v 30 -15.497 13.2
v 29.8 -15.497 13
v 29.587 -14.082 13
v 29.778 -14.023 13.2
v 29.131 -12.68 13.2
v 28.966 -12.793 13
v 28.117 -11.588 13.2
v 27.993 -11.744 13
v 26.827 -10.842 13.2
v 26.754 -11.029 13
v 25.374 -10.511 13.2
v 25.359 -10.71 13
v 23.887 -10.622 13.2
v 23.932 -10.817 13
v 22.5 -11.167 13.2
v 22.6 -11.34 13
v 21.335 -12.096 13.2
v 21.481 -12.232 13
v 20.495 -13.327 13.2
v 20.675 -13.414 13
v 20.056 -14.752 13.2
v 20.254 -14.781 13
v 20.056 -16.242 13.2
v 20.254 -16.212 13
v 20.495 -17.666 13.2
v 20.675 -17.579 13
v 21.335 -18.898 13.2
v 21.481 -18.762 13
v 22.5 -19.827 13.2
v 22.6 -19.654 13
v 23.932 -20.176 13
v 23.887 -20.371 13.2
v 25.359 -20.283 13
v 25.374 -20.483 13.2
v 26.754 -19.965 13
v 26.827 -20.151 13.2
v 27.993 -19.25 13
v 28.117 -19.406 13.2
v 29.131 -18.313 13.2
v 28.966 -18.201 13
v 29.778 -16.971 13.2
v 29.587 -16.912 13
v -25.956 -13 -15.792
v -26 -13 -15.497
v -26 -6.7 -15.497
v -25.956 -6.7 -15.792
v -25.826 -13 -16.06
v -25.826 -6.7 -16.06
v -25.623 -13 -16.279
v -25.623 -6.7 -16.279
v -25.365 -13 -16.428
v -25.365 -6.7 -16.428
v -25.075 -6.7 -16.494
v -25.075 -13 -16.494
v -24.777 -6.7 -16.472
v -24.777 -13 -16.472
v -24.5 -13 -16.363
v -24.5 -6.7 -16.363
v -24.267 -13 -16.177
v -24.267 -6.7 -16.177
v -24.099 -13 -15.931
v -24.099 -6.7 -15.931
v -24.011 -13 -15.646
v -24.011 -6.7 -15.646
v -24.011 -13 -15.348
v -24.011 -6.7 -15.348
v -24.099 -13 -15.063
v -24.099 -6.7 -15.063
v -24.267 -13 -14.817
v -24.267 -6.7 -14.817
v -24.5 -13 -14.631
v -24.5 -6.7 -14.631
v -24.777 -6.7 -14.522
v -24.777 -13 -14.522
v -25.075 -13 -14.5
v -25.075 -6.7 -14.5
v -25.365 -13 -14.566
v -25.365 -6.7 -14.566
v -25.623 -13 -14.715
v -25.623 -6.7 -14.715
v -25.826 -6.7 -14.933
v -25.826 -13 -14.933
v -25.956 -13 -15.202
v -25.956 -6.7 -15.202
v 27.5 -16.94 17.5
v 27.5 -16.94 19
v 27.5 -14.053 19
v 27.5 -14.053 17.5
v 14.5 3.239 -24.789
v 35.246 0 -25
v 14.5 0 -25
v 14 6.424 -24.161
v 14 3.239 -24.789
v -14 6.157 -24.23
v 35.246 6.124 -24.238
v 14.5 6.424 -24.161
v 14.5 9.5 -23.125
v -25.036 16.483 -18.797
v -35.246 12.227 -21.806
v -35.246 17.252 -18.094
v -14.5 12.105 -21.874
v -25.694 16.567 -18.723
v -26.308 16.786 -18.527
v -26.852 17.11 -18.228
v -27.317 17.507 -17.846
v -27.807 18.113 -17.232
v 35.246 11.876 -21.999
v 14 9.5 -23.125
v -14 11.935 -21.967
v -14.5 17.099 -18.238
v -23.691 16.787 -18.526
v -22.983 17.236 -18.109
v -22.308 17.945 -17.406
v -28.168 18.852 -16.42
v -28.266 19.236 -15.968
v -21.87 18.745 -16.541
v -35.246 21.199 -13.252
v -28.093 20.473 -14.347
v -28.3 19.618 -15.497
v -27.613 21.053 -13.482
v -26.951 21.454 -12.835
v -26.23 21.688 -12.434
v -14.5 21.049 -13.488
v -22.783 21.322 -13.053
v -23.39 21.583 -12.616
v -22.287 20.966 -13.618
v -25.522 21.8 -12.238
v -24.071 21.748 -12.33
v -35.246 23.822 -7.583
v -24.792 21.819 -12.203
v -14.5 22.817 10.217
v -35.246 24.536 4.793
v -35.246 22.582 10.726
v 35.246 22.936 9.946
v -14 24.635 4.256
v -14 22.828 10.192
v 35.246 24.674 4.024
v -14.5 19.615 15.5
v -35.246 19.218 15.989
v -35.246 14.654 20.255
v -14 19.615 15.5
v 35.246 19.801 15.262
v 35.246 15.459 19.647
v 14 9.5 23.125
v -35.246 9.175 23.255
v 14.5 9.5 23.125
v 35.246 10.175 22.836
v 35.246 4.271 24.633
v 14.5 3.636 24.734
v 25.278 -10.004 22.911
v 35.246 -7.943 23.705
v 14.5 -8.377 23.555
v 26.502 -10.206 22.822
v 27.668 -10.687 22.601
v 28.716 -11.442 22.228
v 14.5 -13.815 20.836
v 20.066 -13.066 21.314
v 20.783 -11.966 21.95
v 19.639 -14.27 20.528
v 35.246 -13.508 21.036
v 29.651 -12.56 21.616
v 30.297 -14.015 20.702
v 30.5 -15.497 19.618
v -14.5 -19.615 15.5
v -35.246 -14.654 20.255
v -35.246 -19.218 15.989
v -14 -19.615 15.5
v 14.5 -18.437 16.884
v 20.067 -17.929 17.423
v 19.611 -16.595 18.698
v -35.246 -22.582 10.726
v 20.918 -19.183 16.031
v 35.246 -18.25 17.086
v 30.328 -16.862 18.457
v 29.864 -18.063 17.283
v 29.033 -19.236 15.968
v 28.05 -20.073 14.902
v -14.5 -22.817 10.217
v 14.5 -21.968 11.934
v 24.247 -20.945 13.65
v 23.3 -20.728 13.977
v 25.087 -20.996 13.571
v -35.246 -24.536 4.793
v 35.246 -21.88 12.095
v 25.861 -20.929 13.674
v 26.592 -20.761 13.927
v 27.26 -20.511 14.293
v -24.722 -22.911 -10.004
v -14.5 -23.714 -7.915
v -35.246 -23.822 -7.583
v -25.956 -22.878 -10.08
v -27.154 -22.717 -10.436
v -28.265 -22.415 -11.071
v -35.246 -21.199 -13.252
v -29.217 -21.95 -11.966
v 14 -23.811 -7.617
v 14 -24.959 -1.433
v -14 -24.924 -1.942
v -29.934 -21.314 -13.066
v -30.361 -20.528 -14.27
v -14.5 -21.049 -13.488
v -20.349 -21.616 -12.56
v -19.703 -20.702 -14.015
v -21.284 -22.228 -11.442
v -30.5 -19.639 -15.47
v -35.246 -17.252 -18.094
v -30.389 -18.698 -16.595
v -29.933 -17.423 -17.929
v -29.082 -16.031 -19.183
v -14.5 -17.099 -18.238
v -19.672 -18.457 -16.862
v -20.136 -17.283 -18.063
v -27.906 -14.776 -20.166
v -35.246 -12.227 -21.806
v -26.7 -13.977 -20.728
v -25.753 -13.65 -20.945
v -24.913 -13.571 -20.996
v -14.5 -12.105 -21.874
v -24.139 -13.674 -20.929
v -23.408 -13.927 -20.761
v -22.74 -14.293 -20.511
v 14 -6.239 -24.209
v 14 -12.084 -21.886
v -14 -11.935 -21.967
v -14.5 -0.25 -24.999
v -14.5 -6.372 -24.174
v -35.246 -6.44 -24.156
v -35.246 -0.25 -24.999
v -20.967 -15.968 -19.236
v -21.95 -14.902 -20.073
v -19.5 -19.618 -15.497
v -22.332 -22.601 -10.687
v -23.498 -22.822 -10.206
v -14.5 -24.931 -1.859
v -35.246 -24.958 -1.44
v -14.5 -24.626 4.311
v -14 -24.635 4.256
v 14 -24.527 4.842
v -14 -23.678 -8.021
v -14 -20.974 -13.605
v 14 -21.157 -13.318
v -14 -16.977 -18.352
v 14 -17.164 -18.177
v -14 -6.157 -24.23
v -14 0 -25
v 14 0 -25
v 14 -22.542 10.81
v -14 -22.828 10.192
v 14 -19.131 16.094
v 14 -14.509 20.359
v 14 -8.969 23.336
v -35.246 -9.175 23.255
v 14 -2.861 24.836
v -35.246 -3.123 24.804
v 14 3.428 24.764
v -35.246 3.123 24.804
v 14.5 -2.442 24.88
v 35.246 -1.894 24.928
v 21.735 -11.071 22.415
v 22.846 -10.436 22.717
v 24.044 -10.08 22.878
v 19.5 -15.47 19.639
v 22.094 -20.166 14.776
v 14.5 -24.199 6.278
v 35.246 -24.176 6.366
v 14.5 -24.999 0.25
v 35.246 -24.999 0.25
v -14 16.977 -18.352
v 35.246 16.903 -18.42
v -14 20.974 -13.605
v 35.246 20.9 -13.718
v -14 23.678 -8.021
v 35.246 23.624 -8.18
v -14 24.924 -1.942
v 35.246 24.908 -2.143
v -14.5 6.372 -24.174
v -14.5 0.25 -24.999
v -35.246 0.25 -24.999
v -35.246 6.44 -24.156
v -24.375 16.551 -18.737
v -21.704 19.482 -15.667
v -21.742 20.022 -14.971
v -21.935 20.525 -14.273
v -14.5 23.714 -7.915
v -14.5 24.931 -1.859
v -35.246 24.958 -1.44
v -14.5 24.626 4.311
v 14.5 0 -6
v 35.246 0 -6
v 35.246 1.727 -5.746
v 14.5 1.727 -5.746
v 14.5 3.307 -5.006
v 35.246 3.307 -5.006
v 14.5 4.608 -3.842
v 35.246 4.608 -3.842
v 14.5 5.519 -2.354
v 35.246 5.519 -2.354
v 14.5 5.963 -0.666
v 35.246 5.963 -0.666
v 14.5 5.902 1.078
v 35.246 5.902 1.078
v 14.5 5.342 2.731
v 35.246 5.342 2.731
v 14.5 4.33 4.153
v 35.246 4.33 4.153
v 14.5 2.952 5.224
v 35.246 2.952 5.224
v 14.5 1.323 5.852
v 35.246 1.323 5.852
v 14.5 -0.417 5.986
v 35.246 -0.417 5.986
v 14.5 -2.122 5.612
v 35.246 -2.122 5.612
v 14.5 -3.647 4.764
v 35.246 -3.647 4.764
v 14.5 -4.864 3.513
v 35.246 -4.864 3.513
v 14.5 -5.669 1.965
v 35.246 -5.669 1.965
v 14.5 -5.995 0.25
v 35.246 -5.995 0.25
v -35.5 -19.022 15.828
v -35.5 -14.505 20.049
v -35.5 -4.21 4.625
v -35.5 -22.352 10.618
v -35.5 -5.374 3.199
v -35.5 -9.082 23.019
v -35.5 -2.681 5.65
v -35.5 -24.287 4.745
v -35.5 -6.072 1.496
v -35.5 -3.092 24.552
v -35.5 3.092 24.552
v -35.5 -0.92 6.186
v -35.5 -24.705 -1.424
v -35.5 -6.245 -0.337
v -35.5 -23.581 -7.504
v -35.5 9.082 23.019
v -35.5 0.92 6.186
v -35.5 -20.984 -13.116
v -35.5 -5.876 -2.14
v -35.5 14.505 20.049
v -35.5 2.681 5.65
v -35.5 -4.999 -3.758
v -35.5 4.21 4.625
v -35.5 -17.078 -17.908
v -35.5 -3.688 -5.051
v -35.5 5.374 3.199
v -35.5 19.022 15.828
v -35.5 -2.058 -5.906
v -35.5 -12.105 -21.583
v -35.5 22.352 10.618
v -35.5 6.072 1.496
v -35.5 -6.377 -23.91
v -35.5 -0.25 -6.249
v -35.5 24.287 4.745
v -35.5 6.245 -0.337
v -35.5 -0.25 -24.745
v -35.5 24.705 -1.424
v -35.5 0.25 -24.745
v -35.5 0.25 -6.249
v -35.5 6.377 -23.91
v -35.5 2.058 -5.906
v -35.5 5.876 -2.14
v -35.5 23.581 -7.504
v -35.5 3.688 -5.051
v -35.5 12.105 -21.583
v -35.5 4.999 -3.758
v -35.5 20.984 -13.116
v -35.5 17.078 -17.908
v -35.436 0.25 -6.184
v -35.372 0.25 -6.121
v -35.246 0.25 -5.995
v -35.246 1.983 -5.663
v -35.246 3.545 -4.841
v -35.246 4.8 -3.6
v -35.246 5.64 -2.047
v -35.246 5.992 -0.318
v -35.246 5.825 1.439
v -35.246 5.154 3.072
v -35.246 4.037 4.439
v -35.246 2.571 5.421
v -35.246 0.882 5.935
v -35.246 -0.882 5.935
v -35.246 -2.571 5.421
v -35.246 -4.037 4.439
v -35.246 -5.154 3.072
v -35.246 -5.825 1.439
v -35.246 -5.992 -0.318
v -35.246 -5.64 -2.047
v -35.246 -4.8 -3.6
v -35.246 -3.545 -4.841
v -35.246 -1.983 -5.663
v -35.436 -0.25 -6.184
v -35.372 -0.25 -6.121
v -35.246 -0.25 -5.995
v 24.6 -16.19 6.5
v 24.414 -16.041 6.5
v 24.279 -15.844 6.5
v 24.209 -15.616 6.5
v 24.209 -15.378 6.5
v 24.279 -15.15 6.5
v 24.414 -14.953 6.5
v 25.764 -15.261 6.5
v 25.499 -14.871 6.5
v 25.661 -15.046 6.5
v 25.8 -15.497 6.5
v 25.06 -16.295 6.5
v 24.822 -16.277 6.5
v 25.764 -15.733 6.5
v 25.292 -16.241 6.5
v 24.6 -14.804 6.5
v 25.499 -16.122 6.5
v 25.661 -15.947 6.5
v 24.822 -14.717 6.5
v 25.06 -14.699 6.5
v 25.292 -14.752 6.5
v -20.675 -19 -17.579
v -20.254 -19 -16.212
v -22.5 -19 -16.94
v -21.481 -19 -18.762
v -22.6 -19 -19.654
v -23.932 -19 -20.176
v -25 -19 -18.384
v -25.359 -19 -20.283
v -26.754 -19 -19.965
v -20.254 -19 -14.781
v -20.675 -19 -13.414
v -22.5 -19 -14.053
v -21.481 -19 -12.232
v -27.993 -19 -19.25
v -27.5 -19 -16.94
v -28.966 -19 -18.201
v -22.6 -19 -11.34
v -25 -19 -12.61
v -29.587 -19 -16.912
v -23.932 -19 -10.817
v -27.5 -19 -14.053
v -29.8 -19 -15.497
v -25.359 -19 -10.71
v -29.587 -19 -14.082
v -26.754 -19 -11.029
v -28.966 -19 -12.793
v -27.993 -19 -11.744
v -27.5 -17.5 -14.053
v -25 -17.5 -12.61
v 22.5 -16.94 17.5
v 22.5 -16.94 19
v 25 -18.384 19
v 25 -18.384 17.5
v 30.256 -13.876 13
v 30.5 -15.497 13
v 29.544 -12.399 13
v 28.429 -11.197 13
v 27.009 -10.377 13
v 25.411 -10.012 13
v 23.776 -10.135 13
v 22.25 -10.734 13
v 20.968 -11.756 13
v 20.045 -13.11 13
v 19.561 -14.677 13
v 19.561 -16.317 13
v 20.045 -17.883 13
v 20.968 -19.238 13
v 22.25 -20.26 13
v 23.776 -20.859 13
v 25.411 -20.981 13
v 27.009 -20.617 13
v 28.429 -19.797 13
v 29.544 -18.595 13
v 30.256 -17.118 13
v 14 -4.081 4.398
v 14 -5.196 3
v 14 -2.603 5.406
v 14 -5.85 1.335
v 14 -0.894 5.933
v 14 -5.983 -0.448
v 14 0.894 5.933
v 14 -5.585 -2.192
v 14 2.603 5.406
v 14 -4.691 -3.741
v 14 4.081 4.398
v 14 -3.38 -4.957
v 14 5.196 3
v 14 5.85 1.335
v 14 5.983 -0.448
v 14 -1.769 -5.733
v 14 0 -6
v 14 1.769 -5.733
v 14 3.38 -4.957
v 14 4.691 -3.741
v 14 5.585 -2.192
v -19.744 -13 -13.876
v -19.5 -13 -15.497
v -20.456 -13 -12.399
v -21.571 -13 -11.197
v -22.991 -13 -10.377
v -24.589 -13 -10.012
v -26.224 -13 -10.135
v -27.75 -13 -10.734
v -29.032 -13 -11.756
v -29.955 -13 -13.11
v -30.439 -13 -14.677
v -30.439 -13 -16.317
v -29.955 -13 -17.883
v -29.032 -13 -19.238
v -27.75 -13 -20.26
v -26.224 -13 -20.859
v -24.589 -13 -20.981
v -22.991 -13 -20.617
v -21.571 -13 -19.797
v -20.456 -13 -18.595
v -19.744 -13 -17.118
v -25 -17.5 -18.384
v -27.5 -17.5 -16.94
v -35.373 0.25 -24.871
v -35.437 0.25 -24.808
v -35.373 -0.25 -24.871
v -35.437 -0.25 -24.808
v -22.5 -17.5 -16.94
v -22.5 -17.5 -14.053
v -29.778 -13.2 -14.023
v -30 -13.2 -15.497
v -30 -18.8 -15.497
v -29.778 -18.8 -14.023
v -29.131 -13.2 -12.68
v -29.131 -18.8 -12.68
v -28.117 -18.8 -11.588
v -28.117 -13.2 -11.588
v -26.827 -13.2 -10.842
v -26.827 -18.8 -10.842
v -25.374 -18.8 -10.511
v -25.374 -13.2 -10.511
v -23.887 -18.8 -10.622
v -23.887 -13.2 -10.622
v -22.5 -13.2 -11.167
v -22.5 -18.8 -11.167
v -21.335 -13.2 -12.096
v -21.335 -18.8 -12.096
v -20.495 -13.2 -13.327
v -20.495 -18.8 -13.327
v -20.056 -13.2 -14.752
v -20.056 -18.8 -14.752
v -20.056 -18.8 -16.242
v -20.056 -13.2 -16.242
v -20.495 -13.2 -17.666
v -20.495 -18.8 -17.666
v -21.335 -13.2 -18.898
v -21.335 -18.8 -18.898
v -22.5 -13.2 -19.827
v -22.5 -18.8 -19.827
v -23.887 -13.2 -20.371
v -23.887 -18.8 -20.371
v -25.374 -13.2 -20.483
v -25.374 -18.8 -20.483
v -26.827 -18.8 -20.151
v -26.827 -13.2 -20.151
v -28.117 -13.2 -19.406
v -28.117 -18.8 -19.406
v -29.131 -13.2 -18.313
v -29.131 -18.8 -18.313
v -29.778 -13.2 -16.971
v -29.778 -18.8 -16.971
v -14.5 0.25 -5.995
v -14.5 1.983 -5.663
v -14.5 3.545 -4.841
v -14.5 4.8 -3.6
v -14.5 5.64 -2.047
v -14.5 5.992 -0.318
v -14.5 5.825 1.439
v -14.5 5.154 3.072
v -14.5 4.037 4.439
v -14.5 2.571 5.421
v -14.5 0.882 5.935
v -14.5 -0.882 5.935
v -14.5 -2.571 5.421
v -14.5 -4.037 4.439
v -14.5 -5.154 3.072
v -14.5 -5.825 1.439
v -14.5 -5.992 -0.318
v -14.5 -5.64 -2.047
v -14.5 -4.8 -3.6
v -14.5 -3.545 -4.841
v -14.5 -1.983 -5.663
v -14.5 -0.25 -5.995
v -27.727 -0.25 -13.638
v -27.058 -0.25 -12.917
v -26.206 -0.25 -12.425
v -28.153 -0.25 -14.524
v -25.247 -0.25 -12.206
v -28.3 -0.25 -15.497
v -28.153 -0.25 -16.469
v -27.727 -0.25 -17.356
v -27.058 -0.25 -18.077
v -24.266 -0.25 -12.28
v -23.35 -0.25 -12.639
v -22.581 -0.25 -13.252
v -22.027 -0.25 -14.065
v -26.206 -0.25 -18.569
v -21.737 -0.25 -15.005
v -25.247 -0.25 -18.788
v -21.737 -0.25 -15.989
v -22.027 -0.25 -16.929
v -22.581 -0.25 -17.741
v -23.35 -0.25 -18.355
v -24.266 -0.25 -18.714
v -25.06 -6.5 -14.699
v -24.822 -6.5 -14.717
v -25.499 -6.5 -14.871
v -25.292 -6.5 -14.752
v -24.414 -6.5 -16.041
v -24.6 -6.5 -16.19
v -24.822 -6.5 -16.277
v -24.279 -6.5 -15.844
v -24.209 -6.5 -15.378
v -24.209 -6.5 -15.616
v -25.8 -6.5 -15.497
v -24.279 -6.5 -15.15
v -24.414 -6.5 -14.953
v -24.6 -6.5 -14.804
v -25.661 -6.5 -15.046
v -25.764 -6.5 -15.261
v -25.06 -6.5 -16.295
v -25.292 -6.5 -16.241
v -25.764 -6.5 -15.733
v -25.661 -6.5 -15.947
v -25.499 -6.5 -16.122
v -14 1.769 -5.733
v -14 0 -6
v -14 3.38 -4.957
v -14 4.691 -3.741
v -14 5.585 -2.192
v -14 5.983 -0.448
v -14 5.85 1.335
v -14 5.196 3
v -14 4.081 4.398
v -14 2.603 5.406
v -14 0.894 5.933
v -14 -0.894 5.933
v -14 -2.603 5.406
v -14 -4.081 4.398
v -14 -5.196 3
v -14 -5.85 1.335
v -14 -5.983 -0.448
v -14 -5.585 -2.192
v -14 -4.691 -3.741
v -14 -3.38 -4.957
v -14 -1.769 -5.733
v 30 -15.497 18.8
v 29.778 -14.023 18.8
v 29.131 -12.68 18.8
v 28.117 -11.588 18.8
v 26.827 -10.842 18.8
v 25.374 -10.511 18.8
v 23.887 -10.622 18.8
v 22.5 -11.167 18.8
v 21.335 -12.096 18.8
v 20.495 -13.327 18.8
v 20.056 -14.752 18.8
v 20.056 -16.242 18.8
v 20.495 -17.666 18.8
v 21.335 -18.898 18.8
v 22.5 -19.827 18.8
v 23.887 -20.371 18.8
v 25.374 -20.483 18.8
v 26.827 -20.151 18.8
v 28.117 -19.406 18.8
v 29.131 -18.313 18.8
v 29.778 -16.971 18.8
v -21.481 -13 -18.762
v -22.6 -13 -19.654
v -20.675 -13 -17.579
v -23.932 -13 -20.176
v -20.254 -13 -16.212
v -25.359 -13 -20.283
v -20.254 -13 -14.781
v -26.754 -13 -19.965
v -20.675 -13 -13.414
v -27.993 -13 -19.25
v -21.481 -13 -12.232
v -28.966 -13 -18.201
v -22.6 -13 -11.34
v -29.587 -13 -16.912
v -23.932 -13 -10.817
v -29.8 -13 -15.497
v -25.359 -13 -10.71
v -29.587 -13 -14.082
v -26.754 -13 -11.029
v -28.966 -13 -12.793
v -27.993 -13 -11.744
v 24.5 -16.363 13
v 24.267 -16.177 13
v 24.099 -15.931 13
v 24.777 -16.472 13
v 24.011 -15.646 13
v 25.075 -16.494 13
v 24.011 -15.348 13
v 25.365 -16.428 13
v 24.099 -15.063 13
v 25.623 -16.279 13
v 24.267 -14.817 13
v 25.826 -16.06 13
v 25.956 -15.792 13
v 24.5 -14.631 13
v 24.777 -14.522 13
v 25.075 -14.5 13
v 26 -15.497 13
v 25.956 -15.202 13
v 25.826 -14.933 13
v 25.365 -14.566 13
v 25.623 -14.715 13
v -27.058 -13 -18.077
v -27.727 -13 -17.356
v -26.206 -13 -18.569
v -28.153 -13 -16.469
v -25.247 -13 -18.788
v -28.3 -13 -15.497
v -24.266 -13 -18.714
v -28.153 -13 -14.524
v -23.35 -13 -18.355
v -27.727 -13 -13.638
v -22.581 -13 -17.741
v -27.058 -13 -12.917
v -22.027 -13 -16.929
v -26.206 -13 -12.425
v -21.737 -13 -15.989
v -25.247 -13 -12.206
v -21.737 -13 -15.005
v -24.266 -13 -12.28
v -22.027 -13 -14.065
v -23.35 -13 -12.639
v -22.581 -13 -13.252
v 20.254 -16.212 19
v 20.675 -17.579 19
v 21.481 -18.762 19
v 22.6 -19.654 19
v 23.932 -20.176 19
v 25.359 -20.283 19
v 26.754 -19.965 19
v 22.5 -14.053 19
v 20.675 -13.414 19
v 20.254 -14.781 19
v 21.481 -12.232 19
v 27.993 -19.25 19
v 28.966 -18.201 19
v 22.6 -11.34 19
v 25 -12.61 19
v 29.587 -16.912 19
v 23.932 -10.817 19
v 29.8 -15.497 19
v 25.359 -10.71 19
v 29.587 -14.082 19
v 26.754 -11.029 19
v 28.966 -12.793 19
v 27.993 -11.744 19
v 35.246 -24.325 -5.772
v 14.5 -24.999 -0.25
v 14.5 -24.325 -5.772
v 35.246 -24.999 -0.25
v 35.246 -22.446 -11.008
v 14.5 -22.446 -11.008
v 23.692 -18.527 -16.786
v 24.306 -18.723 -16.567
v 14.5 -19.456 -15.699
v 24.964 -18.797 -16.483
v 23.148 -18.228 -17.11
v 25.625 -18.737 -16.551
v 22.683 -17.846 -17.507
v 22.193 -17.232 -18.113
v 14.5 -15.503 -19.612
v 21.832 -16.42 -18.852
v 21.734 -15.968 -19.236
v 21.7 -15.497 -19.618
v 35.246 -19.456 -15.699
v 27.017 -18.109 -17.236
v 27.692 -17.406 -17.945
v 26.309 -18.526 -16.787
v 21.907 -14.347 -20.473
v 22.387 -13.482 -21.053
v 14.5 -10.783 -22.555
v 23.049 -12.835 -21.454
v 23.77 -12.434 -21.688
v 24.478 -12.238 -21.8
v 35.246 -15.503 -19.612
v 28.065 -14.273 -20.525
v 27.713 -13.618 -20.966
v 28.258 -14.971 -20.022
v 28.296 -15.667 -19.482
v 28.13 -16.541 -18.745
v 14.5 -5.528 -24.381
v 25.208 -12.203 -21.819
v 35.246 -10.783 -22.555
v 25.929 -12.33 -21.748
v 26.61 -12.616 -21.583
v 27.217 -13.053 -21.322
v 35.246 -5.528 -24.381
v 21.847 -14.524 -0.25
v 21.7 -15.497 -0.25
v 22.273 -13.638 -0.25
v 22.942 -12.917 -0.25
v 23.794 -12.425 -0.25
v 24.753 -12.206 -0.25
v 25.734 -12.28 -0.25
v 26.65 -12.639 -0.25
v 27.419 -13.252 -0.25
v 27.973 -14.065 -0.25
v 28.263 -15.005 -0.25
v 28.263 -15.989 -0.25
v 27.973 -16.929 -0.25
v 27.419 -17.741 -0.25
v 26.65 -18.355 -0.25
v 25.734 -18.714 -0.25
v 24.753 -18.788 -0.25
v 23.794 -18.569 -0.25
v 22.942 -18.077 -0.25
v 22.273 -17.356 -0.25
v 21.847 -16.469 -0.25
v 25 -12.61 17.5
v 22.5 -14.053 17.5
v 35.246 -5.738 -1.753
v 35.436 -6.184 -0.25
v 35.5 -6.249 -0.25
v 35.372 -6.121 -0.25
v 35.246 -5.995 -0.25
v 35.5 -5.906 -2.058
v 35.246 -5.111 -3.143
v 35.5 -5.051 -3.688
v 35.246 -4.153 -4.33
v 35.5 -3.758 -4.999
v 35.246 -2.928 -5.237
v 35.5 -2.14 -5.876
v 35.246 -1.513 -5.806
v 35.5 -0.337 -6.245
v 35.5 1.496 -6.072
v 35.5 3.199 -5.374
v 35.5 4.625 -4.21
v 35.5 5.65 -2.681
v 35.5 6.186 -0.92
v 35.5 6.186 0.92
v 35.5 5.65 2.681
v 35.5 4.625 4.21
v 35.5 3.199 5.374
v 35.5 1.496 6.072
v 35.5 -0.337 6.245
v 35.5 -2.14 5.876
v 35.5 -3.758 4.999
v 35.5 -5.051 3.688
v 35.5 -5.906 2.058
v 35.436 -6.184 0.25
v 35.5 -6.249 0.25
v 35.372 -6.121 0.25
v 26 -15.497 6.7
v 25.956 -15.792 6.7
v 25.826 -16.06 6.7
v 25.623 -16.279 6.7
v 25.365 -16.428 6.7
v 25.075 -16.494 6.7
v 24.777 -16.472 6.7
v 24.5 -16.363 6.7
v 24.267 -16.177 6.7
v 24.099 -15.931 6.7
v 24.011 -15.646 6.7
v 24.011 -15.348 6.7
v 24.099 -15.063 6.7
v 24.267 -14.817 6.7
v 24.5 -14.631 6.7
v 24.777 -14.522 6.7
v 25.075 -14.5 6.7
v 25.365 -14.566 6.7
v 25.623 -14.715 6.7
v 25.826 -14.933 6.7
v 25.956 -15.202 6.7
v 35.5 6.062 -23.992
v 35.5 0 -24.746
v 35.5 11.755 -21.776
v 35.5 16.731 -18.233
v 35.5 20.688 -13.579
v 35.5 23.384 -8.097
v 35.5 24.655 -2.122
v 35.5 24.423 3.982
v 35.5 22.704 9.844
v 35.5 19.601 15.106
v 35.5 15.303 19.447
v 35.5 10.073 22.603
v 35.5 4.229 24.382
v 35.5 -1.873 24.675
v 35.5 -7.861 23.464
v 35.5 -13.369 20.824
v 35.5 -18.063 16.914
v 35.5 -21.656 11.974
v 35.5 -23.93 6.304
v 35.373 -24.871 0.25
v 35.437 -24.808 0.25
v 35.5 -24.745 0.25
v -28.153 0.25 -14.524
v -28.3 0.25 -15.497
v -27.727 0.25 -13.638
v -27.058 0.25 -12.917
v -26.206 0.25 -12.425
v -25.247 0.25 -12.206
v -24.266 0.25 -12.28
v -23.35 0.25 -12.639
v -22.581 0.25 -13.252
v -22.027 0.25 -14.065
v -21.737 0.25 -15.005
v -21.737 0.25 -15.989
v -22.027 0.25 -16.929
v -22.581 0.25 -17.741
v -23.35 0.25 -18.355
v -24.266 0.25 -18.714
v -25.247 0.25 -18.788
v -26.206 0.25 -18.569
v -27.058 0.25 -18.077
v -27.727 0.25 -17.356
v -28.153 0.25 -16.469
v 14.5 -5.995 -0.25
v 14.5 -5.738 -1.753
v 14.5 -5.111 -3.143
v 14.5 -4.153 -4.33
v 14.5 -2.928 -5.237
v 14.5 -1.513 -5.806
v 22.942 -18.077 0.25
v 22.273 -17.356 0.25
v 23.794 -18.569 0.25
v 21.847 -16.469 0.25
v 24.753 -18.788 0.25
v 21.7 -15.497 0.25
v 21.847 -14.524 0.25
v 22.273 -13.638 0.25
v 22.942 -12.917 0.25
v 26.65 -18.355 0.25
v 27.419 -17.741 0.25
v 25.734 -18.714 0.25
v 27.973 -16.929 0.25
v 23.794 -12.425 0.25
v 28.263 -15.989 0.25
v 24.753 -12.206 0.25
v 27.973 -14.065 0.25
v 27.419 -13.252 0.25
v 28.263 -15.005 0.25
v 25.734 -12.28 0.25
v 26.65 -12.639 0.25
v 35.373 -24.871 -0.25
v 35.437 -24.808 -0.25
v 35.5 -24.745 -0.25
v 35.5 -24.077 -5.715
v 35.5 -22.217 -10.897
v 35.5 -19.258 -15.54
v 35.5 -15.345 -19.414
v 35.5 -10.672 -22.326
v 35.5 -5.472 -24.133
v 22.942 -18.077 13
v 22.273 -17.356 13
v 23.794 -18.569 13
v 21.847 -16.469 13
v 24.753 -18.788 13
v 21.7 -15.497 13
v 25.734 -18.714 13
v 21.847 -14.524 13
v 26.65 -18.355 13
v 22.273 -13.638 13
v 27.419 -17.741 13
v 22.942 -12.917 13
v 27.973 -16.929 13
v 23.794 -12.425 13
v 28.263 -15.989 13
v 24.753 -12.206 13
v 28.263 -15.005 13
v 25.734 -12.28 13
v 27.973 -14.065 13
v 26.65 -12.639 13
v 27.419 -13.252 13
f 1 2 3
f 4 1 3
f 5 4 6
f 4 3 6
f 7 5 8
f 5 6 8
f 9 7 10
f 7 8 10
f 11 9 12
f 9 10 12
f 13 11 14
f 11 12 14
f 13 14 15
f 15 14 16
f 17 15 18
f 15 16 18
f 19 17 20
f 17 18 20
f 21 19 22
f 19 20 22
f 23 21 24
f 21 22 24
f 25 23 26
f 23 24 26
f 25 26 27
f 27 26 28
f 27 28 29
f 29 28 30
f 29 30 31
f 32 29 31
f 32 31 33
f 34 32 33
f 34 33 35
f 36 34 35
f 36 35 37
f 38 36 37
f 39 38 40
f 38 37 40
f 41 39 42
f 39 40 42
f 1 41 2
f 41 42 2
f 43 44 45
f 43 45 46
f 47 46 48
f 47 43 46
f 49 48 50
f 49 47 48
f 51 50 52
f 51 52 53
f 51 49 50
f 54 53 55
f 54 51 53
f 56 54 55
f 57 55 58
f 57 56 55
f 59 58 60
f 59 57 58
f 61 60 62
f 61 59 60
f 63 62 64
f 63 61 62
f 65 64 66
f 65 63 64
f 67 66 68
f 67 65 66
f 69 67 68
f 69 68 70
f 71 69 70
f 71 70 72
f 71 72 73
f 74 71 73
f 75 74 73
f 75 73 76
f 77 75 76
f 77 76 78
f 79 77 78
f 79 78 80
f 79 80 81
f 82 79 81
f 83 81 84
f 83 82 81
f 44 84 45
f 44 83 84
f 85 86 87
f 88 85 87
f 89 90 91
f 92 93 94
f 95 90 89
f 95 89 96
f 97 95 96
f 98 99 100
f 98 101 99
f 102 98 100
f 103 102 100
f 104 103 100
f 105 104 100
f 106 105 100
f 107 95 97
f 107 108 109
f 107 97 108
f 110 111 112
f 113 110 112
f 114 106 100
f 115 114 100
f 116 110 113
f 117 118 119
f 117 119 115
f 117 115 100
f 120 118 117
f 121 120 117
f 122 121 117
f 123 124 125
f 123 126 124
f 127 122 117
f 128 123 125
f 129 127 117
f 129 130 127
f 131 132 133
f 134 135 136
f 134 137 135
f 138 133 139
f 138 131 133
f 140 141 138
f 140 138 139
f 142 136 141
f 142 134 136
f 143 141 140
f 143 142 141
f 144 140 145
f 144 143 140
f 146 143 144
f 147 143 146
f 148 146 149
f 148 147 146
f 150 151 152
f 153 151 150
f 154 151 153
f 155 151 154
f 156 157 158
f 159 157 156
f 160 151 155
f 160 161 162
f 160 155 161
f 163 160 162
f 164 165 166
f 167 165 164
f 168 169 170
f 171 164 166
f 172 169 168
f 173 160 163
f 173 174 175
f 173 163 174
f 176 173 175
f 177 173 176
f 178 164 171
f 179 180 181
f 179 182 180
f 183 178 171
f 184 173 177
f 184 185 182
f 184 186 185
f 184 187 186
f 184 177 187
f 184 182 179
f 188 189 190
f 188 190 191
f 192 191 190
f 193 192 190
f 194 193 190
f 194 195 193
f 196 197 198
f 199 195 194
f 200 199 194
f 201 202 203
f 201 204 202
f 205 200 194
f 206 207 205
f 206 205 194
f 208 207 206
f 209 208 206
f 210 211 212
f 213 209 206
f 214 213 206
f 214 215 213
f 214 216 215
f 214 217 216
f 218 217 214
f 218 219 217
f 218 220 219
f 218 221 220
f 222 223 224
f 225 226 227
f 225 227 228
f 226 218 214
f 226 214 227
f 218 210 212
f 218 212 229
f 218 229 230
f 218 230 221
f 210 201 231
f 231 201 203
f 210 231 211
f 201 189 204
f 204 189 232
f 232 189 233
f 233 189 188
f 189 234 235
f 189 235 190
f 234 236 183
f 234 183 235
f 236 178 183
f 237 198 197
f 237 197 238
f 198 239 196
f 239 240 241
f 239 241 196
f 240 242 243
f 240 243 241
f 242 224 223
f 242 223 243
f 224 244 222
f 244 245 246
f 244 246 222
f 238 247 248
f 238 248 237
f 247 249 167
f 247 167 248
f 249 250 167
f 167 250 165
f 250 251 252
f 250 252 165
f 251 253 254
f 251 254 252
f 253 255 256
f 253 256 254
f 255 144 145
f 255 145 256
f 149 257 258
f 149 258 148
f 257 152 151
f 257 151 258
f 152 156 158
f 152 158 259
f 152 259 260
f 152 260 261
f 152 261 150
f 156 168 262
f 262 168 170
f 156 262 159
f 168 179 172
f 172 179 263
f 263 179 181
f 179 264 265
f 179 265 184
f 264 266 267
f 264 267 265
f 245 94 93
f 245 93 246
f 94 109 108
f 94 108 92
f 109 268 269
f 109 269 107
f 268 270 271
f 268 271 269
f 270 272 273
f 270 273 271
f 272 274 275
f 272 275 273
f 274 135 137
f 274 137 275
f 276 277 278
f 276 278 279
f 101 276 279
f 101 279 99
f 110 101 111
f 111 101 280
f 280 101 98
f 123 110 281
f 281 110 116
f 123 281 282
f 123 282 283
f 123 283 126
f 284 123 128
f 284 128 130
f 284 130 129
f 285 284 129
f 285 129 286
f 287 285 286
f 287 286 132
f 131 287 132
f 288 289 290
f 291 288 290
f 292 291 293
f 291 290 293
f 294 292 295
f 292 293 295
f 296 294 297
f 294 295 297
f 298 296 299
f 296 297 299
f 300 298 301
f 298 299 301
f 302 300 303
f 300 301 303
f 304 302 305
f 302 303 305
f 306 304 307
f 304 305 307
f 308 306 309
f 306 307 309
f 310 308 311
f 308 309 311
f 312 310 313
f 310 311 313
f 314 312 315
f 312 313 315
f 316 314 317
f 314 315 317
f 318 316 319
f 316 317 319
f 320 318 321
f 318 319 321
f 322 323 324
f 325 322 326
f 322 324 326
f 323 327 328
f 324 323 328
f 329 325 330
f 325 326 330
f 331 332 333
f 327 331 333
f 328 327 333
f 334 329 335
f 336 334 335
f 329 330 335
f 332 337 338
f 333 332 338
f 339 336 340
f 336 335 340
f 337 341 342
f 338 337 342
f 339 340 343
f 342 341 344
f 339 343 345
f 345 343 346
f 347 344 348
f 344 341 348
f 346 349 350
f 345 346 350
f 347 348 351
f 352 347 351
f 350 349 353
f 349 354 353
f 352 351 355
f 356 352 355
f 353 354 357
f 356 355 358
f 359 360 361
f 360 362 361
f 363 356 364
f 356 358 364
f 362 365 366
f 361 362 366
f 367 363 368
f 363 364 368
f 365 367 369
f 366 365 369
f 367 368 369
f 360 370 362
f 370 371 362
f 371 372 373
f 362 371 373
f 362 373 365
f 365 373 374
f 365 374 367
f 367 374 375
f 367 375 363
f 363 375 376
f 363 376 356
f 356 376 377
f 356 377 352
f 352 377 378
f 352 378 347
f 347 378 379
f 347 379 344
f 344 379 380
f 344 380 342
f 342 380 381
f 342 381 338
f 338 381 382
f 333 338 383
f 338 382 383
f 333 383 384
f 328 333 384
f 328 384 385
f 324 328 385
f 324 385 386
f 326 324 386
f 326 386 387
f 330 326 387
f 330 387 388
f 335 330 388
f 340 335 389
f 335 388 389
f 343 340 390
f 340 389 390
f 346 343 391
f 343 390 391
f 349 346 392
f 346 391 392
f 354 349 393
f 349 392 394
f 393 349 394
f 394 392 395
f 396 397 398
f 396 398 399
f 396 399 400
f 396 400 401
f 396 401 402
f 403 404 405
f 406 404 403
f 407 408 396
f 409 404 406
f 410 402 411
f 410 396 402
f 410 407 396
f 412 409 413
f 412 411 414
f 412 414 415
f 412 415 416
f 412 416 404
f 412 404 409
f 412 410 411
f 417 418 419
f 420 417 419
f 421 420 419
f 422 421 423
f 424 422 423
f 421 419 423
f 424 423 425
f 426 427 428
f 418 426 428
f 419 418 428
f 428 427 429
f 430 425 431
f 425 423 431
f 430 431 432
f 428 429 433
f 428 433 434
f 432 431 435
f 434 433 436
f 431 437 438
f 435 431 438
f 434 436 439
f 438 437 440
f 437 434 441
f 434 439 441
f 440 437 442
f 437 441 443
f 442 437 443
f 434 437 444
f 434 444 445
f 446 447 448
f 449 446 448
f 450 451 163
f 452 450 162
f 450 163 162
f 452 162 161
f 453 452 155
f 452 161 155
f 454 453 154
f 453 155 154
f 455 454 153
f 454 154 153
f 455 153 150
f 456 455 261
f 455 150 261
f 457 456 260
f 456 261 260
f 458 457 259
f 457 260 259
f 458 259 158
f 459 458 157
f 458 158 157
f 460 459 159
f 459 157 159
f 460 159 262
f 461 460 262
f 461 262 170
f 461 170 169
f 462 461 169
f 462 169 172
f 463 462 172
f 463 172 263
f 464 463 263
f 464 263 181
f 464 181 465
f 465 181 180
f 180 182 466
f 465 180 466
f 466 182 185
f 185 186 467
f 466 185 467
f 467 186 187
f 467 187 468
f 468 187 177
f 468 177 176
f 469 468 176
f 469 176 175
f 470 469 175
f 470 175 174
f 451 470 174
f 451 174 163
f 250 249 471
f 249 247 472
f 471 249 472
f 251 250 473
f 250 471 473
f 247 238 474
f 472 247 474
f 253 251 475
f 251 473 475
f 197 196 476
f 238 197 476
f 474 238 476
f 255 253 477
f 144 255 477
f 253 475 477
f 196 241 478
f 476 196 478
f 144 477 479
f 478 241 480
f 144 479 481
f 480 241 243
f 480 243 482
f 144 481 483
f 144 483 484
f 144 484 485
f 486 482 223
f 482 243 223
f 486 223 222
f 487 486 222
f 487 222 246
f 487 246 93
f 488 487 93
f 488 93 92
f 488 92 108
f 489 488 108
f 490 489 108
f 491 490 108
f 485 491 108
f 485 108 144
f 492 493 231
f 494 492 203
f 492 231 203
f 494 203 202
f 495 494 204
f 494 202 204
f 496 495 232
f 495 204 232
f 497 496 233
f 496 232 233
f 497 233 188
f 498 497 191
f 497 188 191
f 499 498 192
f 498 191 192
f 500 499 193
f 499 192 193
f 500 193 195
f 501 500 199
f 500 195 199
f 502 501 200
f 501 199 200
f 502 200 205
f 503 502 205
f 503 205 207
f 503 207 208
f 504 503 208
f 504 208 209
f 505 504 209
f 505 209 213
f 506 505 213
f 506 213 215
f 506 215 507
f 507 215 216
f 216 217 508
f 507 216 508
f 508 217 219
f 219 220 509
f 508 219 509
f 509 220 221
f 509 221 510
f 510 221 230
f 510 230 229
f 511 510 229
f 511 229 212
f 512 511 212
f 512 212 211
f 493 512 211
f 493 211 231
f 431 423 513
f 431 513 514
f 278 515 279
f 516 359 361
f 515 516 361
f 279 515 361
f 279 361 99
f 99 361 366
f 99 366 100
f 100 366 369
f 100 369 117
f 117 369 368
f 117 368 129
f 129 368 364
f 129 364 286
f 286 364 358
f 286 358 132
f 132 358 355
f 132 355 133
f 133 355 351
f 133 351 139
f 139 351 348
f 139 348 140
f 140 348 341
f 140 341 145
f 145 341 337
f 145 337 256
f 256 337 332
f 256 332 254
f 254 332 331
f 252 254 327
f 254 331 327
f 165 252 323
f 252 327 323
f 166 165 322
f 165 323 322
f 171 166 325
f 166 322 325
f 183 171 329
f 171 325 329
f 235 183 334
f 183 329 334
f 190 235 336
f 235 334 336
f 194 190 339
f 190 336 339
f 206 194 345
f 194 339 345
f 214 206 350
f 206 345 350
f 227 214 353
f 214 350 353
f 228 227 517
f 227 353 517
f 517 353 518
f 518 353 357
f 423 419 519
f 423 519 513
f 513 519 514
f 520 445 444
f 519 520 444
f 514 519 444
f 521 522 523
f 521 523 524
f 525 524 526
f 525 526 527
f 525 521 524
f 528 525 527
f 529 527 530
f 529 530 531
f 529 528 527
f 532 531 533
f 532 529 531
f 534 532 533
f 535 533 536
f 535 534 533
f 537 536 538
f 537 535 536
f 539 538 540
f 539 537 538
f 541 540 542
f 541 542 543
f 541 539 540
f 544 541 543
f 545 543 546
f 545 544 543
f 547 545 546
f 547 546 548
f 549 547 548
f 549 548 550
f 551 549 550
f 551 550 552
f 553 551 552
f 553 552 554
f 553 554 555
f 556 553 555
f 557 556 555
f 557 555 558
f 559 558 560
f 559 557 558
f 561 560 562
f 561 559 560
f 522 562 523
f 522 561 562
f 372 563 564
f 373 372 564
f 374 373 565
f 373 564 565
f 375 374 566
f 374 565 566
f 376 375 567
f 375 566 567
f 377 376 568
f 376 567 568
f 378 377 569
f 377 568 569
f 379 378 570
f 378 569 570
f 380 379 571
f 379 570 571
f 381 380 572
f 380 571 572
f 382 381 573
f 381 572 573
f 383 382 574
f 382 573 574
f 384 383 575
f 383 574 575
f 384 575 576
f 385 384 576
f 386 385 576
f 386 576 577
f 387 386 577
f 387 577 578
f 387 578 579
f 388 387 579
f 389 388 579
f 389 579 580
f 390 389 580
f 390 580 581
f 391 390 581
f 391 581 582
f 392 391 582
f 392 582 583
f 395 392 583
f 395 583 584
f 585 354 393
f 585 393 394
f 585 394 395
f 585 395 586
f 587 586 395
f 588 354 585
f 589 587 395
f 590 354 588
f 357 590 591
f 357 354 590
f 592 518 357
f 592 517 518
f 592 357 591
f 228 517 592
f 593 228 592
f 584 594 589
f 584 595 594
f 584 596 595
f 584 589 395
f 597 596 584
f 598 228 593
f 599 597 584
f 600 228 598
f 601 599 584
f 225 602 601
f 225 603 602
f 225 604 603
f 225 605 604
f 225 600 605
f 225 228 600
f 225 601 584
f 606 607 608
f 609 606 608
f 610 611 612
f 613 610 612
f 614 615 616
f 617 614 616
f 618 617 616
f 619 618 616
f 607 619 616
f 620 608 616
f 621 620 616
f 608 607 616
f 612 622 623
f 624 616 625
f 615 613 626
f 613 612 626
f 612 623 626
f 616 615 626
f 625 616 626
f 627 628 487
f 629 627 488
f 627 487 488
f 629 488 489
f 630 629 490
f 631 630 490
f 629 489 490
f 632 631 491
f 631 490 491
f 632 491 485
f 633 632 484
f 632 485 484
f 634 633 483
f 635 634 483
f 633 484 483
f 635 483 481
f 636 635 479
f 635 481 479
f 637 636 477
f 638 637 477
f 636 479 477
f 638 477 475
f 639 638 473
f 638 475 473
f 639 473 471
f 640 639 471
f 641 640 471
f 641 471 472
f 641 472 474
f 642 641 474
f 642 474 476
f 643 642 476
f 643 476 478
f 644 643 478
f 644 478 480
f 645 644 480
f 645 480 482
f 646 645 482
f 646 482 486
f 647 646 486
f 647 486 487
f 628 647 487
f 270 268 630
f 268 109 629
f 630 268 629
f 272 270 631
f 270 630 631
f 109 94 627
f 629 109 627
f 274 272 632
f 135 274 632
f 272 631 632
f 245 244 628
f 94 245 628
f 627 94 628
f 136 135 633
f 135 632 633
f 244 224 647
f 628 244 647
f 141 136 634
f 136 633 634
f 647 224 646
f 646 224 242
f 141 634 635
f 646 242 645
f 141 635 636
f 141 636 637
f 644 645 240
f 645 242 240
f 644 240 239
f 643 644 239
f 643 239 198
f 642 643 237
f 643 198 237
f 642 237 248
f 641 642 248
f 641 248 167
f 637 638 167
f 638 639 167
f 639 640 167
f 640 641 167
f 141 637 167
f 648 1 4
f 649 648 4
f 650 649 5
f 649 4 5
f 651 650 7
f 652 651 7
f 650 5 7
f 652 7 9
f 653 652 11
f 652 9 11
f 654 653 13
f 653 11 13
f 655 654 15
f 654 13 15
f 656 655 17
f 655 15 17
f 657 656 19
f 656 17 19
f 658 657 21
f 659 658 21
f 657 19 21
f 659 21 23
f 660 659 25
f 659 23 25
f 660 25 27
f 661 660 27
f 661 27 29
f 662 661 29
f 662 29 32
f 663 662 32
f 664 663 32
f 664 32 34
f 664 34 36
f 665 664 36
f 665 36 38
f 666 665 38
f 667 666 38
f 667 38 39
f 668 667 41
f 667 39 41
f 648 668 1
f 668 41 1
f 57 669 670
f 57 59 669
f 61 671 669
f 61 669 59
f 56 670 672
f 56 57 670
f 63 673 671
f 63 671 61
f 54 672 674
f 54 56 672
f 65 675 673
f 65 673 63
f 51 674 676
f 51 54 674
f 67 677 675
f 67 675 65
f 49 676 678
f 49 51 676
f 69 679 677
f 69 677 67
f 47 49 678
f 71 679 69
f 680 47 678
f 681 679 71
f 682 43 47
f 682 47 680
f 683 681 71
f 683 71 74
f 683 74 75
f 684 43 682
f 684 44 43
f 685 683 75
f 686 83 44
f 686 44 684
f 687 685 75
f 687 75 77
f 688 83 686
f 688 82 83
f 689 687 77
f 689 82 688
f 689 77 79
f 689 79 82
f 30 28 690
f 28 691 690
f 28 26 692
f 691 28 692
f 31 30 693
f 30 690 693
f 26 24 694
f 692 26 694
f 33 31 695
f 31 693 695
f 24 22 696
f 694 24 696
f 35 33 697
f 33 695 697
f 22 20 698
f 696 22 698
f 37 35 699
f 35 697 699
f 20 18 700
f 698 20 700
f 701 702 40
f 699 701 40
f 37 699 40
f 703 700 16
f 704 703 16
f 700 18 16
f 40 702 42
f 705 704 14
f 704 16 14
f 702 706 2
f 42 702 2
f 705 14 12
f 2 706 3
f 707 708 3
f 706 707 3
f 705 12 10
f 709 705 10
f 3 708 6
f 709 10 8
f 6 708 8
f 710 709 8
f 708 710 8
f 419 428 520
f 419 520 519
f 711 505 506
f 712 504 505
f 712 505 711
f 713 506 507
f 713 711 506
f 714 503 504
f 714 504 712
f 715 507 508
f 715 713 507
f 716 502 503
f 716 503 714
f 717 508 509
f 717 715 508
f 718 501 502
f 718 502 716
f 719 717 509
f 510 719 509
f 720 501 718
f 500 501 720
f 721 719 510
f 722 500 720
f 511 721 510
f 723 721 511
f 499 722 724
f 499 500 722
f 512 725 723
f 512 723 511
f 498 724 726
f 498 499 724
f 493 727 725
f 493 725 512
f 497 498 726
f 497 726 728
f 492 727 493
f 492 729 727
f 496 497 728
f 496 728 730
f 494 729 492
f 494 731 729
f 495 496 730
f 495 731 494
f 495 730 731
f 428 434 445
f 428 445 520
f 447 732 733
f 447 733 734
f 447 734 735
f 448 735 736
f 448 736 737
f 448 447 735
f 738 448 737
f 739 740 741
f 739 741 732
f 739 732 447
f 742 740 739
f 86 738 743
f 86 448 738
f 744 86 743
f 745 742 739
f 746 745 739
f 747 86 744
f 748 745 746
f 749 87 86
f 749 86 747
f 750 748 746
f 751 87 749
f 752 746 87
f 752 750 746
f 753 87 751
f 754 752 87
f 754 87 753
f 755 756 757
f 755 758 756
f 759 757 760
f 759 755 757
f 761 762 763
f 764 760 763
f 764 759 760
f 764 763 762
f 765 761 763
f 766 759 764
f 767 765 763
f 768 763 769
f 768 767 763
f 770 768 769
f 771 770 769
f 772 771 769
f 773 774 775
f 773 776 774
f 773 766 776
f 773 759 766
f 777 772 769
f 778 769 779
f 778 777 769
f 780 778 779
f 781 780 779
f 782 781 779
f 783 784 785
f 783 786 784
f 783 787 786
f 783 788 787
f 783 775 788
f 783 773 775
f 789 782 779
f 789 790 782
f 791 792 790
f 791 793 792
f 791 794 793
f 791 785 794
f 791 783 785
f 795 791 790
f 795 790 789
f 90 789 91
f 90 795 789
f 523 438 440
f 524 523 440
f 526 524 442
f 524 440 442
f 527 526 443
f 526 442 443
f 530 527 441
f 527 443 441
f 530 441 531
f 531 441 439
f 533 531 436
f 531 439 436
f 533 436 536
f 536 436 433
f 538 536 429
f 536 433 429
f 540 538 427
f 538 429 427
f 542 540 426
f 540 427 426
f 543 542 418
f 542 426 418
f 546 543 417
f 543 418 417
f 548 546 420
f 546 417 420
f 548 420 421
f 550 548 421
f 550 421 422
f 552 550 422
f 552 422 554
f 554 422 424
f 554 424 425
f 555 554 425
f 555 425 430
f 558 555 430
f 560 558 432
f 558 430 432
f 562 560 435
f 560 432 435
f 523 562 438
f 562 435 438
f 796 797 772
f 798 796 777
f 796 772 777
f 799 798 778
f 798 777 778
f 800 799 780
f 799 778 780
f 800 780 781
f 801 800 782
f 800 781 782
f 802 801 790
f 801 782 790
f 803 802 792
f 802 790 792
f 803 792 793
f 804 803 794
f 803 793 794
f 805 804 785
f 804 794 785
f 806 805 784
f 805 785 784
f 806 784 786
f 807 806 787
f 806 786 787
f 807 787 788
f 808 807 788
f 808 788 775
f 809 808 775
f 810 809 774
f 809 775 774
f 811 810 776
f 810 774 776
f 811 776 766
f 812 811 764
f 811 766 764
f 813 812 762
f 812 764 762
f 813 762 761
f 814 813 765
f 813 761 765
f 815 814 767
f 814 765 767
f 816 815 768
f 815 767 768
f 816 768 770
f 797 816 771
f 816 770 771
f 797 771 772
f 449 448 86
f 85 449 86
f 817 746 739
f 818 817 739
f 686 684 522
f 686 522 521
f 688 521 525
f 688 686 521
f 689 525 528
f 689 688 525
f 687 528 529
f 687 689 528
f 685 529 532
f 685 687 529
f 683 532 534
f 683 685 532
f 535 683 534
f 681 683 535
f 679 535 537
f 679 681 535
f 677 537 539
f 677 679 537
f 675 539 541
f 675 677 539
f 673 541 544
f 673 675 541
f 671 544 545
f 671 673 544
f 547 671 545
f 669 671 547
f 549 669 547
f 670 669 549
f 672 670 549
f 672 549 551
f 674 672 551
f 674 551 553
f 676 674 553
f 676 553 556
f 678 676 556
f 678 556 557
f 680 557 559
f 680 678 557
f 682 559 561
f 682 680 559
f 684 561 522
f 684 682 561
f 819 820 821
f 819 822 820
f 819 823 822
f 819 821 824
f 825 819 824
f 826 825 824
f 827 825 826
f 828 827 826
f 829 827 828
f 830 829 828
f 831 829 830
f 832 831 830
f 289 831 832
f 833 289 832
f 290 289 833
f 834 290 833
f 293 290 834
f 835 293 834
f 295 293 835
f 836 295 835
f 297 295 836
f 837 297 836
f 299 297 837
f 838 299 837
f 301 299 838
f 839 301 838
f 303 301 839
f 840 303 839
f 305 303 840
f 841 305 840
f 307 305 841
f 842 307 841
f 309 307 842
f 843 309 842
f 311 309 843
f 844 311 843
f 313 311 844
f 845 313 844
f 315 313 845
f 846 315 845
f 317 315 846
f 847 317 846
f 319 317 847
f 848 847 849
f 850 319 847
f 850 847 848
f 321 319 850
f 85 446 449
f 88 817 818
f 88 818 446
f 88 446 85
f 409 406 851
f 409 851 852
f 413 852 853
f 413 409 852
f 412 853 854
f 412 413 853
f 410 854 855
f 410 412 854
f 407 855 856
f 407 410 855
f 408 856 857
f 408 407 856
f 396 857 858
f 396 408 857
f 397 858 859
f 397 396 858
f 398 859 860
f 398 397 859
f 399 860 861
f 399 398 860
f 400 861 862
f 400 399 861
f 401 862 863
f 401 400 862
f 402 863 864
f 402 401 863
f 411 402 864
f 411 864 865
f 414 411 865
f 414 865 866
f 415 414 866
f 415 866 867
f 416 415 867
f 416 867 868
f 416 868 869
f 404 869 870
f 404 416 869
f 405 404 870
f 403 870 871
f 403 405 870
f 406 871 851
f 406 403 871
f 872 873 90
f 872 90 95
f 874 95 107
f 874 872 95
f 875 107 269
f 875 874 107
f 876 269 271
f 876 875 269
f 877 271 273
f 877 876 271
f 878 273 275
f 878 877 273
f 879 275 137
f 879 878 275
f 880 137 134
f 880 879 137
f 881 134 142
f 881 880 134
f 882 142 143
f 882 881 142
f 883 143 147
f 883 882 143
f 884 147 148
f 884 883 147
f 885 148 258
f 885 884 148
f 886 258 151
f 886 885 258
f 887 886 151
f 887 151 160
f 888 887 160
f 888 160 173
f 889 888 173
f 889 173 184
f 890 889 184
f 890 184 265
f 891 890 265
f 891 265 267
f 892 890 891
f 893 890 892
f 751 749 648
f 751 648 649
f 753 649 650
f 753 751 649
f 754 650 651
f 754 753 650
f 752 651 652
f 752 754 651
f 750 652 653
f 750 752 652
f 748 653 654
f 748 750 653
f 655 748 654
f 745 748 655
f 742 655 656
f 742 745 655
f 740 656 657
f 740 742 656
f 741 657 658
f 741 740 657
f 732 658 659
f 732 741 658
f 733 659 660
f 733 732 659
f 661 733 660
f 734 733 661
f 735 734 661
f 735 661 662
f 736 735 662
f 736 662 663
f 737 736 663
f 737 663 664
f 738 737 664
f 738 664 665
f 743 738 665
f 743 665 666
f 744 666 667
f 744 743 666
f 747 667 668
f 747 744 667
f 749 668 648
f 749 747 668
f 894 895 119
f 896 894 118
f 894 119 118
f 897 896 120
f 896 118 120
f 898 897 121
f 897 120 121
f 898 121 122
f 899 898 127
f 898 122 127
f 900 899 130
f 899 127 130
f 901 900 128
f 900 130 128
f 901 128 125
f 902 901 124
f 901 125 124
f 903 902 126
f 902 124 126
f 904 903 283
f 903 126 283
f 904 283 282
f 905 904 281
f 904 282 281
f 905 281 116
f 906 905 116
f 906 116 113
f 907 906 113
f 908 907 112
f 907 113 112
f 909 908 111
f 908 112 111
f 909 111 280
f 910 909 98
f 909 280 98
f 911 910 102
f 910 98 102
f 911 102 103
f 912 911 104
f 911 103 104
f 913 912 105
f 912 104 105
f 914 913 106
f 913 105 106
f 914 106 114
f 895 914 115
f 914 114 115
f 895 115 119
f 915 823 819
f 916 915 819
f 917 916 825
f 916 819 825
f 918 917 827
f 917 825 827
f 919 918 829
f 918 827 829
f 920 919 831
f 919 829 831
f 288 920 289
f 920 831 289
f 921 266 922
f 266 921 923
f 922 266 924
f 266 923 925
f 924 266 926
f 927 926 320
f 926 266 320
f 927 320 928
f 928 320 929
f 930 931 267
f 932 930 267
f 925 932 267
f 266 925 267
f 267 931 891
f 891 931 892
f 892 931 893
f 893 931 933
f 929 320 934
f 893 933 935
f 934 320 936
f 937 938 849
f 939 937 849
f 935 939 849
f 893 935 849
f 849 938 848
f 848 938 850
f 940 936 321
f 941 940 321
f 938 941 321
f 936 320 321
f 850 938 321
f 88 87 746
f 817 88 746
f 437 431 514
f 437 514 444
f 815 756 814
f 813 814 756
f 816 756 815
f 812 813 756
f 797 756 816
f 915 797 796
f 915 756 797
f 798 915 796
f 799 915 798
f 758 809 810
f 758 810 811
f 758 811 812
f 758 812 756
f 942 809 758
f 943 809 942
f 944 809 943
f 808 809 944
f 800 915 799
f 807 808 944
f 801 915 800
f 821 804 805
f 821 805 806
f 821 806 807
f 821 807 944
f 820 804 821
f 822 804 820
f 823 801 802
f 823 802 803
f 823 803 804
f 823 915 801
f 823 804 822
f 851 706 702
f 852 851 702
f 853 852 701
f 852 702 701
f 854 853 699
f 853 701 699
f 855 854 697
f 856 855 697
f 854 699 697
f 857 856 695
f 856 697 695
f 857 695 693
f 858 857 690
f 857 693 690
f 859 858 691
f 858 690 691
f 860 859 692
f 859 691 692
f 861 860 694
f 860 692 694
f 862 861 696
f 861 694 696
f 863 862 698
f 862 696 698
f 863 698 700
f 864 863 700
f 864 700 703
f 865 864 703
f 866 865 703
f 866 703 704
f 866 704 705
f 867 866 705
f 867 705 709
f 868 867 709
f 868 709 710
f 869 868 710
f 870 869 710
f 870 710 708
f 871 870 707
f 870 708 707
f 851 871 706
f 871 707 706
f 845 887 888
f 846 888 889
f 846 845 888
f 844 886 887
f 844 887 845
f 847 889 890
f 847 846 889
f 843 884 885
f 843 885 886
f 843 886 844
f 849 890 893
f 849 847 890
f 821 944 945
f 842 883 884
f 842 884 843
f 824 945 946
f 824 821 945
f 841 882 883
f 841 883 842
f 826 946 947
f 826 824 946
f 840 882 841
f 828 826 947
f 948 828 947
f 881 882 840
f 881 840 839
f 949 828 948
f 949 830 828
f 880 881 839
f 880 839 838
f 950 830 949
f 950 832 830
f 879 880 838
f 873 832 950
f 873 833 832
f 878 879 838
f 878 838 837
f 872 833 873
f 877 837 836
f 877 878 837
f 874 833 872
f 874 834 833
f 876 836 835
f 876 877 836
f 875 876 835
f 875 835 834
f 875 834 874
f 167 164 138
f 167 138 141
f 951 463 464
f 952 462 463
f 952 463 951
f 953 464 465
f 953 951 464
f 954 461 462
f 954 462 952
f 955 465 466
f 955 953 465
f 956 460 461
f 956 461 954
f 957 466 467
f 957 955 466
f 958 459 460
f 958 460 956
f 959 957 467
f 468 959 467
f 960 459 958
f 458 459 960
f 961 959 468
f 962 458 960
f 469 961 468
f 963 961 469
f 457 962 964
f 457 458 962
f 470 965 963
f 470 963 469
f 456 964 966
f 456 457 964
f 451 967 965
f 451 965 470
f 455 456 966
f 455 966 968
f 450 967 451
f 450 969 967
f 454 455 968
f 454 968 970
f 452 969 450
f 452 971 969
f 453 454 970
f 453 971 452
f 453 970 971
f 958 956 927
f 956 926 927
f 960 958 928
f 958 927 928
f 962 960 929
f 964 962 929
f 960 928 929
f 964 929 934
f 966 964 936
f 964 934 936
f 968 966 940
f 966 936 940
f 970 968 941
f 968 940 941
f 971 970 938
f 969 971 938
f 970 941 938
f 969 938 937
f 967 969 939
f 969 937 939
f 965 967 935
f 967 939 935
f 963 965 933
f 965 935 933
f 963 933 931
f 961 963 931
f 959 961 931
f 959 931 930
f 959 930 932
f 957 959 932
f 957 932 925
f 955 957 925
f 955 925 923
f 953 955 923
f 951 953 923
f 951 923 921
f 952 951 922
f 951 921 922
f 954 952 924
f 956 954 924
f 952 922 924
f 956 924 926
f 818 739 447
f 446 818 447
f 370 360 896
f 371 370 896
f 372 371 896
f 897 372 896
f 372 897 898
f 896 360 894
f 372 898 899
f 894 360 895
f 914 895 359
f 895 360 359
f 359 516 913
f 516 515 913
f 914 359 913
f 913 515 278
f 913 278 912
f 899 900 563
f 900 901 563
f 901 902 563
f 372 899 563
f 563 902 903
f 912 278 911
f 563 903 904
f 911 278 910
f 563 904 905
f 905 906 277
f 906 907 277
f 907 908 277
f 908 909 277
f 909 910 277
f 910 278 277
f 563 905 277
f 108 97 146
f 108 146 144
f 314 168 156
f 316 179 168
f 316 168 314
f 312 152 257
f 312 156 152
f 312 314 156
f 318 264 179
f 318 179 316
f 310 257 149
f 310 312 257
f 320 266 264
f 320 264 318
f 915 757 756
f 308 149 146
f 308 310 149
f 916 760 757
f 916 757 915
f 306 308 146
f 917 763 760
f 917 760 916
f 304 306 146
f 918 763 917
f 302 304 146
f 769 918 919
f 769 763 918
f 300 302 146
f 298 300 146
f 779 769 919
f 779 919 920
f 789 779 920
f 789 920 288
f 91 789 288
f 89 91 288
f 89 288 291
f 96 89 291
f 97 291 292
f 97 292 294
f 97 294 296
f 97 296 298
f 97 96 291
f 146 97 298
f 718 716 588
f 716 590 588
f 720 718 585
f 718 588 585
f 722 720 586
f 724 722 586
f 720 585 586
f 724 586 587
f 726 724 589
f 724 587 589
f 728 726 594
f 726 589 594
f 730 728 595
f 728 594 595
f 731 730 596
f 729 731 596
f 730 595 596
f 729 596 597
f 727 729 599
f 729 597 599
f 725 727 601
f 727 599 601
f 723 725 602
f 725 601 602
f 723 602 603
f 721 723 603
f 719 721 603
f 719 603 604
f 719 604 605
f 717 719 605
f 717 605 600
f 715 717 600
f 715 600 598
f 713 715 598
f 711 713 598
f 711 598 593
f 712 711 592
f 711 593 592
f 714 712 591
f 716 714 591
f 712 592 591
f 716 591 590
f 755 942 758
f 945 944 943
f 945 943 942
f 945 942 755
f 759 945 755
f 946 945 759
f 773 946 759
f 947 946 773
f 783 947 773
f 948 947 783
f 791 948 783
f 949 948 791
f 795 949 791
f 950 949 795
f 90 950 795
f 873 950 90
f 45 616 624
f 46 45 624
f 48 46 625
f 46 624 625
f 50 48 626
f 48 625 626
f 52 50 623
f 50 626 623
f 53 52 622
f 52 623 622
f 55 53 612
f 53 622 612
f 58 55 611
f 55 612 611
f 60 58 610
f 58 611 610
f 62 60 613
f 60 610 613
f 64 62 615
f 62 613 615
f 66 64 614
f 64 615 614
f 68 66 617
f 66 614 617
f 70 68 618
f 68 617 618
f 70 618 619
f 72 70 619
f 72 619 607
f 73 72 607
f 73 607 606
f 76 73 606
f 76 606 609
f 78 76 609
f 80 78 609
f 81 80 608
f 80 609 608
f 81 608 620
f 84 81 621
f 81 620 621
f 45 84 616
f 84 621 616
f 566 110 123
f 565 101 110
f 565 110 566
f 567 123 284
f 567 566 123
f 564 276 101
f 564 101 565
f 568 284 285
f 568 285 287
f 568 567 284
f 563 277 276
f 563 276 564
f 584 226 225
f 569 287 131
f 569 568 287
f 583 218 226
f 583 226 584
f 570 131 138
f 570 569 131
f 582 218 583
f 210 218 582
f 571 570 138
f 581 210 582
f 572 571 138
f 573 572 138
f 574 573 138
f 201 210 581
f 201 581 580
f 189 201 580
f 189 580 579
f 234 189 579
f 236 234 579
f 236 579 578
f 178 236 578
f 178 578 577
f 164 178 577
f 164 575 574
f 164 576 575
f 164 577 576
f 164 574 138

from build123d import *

# Parameters (mm, degrees)
SKETCH1_R                      = 25
BOSS_EXTRUDE1_DEPTH            = 35.5
SKETCH2_R                      = 6
CUT_EXTRUDE1_DEPTH             = 72
CHAMFER1_SIZE                  = 0.254
SKETCH4_W                      = 0.5
SKETCH4_H                      = 40.5
CUT_EXTRUDE2_DEPTH             = 51
SKETCH7_W                      = 0.5
SKETCH7_H                      = 34.5
CUT_EXTRUDE3_DEPTH             = 51
SKETCH8_W                      = 21
SKETCH8_H                      = 25
CUT_EXTRUDE5_DEPTH             = 0.25
SKETCH13_W                     = 21
SKETCH13_H                     = 25
CUT_EXTRUDE6_DEPTH             = 0.25
CBORE_FOR_M6_SHCS1_D           = 6.6
CBORE_FOR_M6_SHCS1_CBORE_D     = 11
CBORE_FOR_M6_SHCS1_CBORE_DEPTH = 12
CBORE_FOR_M6_SHCS2_D           = 6.6
CBORE_FOR_M6_SHCS2_CBORE_D     = 11
CBORE_FOR_M6_SHCS2_CBORE_DEPTH = 12
SKETCH16_R                     = 5
BOSS_EXTRUDE2_DEPTH            = 6
SKETCH17_R                     = 1
BOSS_EXTRUDE3_DEPTH            = 6.5
CHAMFER2_SIZE                  = 0.2
CUT_EXTRUDE7_DEPTH             = 1.5
CIRPATTERN1_COUNT              = 2
CIRPATTERN1_ANGLE              = 90


with BuildPart() as part:
    # Sketch1 → Boss-Extrude1 (new body, symmetric)
    with BuildSketch(Plane(origin=(0, 0, 0), x_dir=(0, 0, -1), z_dir=(1, 0, 0))):
        Circle(SKETCH1_R)
    extrude(amount=BOSS_EXTRUDE1_DEPTH, both=True)

    # Sketch2 → Cut-Extrude1 (cut, through all)
    with BuildSketch(Plane(origin=(35.5, 0, 0), x_dir=(0, 0, -1), z_dir=(1, 0, 0))):
        Circle(SKETCH2_R)
    extrude(amount=-CUT_EXTRUDE1_DEPTH, mode=Mode.SUBTRACT)

    # Chamfer1
    chamfer1_edges = [part.edges().sort_by_distance(p)[0] for p in [
        (-35.5, 0, 25),
        (35.5, 0, 25),
        (-35.5, 0, 6),
        (35.5, 0, 6),
    ]]
    chamfer(chamfer1_edges, length=CHAMFER1_SIZE)

    # Sketch4 → Cut-Extrude2 (cut, through all)
    with BuildSketch(Plane.XZ.offset(25)):
        with Locations((-14.25, -4.75)):
            Rectangle(SKETCH4_W, SKETCH4_H)
    extrude(amount=-CUT_EXTRUDE2_DEPTH, mode=Mode.SUBTRACT)

    # Sketch7 → Cut-Extrude3 (cut, through all)
    with BuildSketch(Plane(origin=(0, 0, -25), x_dir=(-1, 0, 0), z_dir=(0, 0, -1))):
        with Locations((-14.25, -7.75)):
            Rectangle(SKETCH7_W, SKETCH7_H)
    extrude(amount=-CUT_EXTRUDE3_DEPTH, mode=Mode.SUBTRACT)

    # Sketch8 → Cut-Extrude5 (cut, symmetric)
    with BuildSketch(Plane(origin=(0, 0, 0), x_dir=(1, 0, 0), z_dir=(0, 1, 0))):
        with Locations((-25, 12.5)):
            Rectangle(SKETCH8_W, SKETCH8_H)
    extrude(amount=CUT_EXTRUDE5_DEPTH, both=True, mode=Mode.SUBTRACT)

    # Sketch13 → Cut-Extrude6 (cut, symmetric)
    with BuildSketch(Plane.XY):
        with Locations((25, -12.5)):
            Rectangle(SKETCH13_W, SKETCH13_H)
    extrude(amount=CUT_EXTRUDE6_DEPTH, both=True, mode=Mode.SUBTRACT)

    # CBORE for M6 SHCS1 (through all)
    with Locations(Plane.XZ.offset(25)):
        with Locations((-25, -15.496769686)):
            CounterBoreHole(CBORE_FOR_M6_SHCS1_D / 2, CBORE_FOR_M6_SHCS1_CBORE_D / 2, CBORE_FOR_M6_SHCS1_CBORE_DEPTH)

    # CBORE for M6 SHCS2 (through all)
    with Locations(Plane.XY.offset(25)):
        with Locations((25, -15.496769686)):
            CounterBoreHole(CBORE_FOR_M6_SHCS2_D / 2, CBORE_FOR_M6_SHCS2_CBORE_D / 2, CBORE_FOR_M6_SHCS2_CBORE_DEPTH)


with BuildPart() as body_2:
    # Sketch16 → Boss-Extrude2 (new body)
    with BuildSketch(Plane.XY.offset(13)):
        with Locations((25, -15.496769686)):
            Circle(SKETCH16_R)
    extrude(amount=BOSS_EXTRUDE2_DEPTH)

    # Sketch17 → Boss-Extrude3 (add)
    with BuildSketch(Plane(origin=(0, 0, 13), x_dir=(-1, 0, 0), z_dir=(0, 0, -1))):
        with Locations(Location((-25, -15.496769686, 0), (0, 0, 180))):  # turned: the seam where the file's is
            Circle(SKETCH17_R)
    extrude(amount=BOSS_EXTRUDE3_DEPTH)

    # Chamfer2
    chamfer2_edges = [body_2.edges().sort_by_distance(p)[0] for p in [
        (20, -15.496769686, 13),
        (20, -15.496769686, 19),
        (24, -15.496769686, 6.5),
    ]]
    chamfer(chamfer2_edges, length=CHAMFER2_SIZE)

    # Sketch18 → Cut-Extrude7 (cut)
    with BuildSketch(Plane.XY.offset(19)):
        Polygon((25, -18.383521032), (27.5, -16.940145359), (27.5, -14.053394013), (25, -12.61001834), (22.5, -14.053394013), (22.5, -16.940145359), align=None)
    extrude(amount=-CUT_EXTRUDE7_DEPTH, mode=Mode.SUBTRACT)


with BuildPart() as body_3:
    # Mirror1: mirrored copy
    add(body_2.part.mirror(Plane(origin=(0, 0, 0), x_dir=(0, 0, 1), z_dir=(1, 0, 0))))


with BuildPart() as cirpattern1_1:
    # CirPattern1: pattern copy
    add(body_3.part.rotate(Axis((0, 0, 0), (1, 0, 0)), 1 * CIRPATTERN1_ANGLE / (CIRPATTERN1_COUNT - 1)))


solid = Compound([part.part, body_2.part, cirpattern1_1.part])
